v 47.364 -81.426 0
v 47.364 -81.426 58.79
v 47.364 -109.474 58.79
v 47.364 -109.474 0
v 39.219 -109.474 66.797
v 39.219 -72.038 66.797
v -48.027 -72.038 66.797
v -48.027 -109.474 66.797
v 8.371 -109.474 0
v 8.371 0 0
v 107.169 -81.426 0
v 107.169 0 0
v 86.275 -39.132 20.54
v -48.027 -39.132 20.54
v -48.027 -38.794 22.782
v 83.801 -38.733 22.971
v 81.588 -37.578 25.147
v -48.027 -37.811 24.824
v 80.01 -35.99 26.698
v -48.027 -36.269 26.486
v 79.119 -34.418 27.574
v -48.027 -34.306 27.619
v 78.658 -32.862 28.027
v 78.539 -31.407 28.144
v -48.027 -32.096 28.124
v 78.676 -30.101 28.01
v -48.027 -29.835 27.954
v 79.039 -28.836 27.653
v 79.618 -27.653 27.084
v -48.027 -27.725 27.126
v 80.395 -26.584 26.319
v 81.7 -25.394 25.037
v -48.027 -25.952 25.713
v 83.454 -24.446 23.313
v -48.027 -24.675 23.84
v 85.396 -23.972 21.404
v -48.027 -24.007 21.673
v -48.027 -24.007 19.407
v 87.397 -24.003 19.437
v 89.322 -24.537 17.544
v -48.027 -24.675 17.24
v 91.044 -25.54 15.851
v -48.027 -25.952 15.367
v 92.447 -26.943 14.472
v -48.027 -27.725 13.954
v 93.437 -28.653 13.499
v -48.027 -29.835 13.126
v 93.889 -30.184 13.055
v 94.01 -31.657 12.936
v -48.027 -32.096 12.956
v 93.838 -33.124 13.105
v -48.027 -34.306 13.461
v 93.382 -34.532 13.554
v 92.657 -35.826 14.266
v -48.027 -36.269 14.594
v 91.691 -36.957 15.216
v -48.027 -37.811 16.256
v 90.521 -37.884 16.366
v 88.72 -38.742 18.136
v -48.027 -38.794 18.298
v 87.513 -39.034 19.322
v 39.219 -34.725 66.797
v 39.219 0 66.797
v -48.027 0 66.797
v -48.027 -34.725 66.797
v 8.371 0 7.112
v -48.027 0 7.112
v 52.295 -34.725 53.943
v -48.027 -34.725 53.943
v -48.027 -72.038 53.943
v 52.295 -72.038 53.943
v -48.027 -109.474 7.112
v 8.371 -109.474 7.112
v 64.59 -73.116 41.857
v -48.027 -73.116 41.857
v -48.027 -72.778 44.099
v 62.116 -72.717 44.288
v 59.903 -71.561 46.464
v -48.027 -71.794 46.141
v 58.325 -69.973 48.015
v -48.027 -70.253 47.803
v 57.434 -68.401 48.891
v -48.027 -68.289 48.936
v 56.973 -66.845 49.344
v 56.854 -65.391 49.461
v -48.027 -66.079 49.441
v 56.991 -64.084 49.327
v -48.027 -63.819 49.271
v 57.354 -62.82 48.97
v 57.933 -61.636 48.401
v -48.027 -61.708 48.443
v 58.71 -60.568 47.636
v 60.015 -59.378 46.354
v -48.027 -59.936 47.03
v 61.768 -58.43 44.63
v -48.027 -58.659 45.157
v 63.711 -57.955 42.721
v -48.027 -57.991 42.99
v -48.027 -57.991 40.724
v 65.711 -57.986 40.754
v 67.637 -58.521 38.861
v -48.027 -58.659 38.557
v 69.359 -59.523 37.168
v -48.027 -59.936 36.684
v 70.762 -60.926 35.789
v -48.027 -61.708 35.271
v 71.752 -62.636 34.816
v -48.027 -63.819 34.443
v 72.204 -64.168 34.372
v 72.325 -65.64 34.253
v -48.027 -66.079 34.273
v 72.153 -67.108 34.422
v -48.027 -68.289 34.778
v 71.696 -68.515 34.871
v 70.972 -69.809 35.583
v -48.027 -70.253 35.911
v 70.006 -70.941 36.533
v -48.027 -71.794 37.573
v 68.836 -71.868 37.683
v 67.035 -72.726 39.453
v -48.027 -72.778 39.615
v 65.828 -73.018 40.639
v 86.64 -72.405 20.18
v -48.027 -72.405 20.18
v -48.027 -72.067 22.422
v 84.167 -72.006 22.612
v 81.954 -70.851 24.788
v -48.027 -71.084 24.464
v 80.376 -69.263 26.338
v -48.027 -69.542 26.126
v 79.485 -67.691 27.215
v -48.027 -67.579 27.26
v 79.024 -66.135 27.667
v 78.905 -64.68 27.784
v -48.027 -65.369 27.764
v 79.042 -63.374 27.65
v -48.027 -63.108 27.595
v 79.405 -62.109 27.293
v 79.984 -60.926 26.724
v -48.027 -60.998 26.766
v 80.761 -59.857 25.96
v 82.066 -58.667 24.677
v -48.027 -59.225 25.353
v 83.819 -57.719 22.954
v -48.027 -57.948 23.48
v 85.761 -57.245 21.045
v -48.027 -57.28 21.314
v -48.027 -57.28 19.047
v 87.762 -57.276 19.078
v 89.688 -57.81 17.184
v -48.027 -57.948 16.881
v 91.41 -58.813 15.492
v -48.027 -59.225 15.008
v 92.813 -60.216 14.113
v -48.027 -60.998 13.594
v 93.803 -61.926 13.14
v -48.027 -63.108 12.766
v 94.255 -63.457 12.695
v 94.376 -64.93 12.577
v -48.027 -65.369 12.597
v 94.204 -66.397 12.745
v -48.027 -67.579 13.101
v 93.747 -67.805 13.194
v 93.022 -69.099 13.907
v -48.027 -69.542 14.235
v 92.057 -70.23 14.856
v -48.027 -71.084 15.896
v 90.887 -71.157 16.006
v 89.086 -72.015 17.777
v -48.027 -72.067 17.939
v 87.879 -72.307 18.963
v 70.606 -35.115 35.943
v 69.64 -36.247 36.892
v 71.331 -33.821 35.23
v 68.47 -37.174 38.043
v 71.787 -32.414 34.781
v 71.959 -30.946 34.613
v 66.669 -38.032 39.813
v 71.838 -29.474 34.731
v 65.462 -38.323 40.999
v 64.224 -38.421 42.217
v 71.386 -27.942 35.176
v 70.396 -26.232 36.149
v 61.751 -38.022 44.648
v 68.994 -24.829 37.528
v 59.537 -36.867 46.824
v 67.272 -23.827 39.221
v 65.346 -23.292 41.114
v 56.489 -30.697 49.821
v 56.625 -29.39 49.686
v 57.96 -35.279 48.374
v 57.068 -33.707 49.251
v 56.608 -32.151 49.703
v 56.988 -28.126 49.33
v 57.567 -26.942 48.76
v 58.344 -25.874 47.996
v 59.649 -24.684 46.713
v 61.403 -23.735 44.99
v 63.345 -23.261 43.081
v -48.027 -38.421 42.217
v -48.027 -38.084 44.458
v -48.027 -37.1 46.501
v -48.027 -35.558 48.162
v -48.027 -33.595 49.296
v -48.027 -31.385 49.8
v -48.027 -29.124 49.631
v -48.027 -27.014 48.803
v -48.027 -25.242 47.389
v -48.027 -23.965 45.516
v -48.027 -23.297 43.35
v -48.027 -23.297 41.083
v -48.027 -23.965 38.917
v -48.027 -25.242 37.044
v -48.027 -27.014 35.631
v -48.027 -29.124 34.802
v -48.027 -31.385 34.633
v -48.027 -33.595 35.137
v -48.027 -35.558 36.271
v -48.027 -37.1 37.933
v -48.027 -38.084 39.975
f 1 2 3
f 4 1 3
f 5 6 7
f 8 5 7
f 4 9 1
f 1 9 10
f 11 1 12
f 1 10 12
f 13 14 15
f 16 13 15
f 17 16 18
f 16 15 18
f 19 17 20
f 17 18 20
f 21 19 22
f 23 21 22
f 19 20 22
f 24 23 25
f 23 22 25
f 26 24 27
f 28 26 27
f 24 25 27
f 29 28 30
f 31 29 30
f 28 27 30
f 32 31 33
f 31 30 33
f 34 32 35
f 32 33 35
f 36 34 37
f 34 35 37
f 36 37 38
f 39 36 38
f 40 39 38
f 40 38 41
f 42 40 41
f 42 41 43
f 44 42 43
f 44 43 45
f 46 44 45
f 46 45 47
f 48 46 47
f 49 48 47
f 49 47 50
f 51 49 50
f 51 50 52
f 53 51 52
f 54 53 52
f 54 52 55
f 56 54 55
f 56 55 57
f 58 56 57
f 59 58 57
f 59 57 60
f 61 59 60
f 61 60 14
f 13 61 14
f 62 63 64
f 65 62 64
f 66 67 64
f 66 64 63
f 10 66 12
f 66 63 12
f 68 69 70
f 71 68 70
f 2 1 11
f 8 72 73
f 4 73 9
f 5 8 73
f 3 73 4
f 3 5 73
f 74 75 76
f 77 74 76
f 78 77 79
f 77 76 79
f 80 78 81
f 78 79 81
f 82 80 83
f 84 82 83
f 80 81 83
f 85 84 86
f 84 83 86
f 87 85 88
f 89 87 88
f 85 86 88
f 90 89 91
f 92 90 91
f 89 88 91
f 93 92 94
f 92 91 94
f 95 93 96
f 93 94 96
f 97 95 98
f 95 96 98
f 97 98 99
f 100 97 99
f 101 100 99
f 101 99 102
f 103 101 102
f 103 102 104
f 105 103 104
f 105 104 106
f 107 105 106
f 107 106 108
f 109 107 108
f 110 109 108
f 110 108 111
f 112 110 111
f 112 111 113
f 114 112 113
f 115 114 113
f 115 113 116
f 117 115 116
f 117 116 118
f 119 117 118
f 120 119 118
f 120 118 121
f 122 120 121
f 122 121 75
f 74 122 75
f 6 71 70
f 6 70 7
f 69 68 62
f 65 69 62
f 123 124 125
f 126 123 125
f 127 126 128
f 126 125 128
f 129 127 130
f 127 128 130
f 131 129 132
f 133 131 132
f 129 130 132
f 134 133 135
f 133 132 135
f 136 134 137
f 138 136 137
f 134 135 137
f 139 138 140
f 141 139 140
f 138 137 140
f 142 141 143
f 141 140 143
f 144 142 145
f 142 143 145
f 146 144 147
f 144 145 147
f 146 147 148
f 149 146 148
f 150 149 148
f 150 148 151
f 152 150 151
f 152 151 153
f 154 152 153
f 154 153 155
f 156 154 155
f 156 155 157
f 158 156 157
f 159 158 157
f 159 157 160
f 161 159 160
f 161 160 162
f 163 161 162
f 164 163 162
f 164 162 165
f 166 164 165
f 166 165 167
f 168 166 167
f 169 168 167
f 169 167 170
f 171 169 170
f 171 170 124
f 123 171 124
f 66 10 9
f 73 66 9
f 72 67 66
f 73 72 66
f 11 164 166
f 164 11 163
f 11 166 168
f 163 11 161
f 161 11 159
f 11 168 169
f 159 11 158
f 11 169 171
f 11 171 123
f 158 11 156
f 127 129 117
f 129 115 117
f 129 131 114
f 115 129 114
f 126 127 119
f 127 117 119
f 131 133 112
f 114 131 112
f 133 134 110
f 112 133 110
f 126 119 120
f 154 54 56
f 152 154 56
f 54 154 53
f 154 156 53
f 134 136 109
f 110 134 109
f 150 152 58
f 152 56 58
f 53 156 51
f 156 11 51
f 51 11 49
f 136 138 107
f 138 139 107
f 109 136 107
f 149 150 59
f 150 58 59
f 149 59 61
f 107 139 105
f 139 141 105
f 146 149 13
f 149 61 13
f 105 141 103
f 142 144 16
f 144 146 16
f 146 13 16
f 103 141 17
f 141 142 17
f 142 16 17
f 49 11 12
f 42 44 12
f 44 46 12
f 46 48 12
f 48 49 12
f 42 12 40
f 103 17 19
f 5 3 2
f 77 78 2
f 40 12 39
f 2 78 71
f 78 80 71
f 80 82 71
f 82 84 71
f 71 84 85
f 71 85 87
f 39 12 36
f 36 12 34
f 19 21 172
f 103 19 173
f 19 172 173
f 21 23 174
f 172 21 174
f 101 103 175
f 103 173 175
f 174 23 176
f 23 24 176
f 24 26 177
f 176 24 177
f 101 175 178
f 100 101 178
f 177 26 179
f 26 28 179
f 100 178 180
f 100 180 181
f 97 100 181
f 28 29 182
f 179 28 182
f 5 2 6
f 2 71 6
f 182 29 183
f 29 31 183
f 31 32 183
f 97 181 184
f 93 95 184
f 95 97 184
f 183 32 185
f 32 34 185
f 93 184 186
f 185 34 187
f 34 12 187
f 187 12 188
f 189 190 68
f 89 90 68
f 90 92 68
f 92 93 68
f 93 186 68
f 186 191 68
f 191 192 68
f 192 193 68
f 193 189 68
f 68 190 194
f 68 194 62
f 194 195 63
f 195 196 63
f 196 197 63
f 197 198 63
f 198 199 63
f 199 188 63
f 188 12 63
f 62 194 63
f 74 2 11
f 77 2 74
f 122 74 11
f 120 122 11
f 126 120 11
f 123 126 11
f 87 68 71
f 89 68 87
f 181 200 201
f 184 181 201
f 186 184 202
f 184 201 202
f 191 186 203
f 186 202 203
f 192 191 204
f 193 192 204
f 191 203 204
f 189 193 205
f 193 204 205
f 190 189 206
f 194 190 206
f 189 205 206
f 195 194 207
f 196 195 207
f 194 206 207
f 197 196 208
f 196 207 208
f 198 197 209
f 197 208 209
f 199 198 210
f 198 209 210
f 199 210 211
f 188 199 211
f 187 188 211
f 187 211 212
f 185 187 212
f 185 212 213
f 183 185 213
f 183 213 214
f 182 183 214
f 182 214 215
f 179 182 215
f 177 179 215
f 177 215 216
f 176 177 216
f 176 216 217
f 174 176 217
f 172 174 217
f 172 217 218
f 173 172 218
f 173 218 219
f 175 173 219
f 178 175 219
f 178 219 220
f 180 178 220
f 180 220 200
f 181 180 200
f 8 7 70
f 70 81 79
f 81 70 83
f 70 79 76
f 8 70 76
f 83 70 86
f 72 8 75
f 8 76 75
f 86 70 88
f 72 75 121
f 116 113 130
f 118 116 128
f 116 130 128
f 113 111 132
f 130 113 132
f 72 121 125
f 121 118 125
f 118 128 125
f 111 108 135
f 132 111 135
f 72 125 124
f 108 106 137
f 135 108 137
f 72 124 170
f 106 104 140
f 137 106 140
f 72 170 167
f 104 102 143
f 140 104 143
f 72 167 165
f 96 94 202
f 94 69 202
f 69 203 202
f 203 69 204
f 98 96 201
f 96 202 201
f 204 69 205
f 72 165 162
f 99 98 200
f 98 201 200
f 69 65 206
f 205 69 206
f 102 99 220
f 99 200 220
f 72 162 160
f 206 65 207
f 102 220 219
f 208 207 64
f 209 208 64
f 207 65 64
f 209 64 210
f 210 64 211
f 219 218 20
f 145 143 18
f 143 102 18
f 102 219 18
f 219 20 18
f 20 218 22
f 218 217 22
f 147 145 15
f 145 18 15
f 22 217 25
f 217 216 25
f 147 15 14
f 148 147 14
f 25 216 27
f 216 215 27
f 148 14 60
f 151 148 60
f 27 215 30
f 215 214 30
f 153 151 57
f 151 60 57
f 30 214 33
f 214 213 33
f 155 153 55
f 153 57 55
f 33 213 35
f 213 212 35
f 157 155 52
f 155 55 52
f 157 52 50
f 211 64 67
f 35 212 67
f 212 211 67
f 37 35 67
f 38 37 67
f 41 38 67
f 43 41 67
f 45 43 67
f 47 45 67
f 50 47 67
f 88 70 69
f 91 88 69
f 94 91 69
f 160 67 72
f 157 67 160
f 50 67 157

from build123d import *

# Parameters (mm, degrees)
F1_DEPTH = 109.474
F2_W     = 37.3121537268
F2_H     = 12.854102999
F2_R     = 7.6049065211
F3_DEPTH = 155.1973314414
F4_W     = 59.8052963614
F4_H     = 28.047692441
F5_DEPTH = 66.7983458767
F6_W     = 56.3981542364
F6_H     = 109.474
F7_DEPTH = 7.112


with BuildPart() as f1:
    # F0 (on Front) → F1 (new body)
    with BuildSketch(Plane.XZ):
        Polygon((-48.026971519, 66.7973458767), (-48.026971519, 0), (107.1693599224, 0), (39.2185337842, 66.7973458767), align=None)
    extrude(amount=F1_DEPTH)

    # F2 (on face) → F3 (cut, through all)
    with BuildSketch(Plane(origin=(-48.026971519, 0, 0), x_dir=(0, -1, 0), z_dir=(-1, 0, 0))):
        with Locations((53.3815380186, 60.3702943772)):
            Rectangle(F2_W, F2_H)
        with Locations((30.8165661991, 42.21656546)):
            Circle(F2_R)
        with Locations((31.5272733569, 20.5399803817)):
            Circle(F2_R)
        with Locations((64.8002144327, 20.1804041862)):
            Circle(F2_R)
        with Locations((65.5109215906, 41.8569892645)):
            Circle(F2_R)
    extrude(amount=-F3_DEPTH, mode=Mode.SUBTRACT)

    # F4 (on face) → F5 (cut, through all)
    with BuildSketch(Plane(origin=(0, 0, 0), x_dir=(1, 0, 0), z_dir=(0, 0, -1))):
        with Locations((77.2667117417, 95.4501537795)):
            Rectangle(F4_W, F4_H)
    extrude(amount=-F5_DEPTH, mode=Mode.SUBTRACT)

    # F6 (on face) → F7 (cut)
    with BuildSketch(Plane(origin=(0, 0, 0), x_dir=(1, 0, 0), z_dir=(0, 0, -1))):
        with Locations((-19.8278944008, 54.737)):
            Rectangle(F6_W, F6_H)
    extrude(amount=-F7_DEPTH, mode=Mode.SUBTRACT)


solid = f1.part
